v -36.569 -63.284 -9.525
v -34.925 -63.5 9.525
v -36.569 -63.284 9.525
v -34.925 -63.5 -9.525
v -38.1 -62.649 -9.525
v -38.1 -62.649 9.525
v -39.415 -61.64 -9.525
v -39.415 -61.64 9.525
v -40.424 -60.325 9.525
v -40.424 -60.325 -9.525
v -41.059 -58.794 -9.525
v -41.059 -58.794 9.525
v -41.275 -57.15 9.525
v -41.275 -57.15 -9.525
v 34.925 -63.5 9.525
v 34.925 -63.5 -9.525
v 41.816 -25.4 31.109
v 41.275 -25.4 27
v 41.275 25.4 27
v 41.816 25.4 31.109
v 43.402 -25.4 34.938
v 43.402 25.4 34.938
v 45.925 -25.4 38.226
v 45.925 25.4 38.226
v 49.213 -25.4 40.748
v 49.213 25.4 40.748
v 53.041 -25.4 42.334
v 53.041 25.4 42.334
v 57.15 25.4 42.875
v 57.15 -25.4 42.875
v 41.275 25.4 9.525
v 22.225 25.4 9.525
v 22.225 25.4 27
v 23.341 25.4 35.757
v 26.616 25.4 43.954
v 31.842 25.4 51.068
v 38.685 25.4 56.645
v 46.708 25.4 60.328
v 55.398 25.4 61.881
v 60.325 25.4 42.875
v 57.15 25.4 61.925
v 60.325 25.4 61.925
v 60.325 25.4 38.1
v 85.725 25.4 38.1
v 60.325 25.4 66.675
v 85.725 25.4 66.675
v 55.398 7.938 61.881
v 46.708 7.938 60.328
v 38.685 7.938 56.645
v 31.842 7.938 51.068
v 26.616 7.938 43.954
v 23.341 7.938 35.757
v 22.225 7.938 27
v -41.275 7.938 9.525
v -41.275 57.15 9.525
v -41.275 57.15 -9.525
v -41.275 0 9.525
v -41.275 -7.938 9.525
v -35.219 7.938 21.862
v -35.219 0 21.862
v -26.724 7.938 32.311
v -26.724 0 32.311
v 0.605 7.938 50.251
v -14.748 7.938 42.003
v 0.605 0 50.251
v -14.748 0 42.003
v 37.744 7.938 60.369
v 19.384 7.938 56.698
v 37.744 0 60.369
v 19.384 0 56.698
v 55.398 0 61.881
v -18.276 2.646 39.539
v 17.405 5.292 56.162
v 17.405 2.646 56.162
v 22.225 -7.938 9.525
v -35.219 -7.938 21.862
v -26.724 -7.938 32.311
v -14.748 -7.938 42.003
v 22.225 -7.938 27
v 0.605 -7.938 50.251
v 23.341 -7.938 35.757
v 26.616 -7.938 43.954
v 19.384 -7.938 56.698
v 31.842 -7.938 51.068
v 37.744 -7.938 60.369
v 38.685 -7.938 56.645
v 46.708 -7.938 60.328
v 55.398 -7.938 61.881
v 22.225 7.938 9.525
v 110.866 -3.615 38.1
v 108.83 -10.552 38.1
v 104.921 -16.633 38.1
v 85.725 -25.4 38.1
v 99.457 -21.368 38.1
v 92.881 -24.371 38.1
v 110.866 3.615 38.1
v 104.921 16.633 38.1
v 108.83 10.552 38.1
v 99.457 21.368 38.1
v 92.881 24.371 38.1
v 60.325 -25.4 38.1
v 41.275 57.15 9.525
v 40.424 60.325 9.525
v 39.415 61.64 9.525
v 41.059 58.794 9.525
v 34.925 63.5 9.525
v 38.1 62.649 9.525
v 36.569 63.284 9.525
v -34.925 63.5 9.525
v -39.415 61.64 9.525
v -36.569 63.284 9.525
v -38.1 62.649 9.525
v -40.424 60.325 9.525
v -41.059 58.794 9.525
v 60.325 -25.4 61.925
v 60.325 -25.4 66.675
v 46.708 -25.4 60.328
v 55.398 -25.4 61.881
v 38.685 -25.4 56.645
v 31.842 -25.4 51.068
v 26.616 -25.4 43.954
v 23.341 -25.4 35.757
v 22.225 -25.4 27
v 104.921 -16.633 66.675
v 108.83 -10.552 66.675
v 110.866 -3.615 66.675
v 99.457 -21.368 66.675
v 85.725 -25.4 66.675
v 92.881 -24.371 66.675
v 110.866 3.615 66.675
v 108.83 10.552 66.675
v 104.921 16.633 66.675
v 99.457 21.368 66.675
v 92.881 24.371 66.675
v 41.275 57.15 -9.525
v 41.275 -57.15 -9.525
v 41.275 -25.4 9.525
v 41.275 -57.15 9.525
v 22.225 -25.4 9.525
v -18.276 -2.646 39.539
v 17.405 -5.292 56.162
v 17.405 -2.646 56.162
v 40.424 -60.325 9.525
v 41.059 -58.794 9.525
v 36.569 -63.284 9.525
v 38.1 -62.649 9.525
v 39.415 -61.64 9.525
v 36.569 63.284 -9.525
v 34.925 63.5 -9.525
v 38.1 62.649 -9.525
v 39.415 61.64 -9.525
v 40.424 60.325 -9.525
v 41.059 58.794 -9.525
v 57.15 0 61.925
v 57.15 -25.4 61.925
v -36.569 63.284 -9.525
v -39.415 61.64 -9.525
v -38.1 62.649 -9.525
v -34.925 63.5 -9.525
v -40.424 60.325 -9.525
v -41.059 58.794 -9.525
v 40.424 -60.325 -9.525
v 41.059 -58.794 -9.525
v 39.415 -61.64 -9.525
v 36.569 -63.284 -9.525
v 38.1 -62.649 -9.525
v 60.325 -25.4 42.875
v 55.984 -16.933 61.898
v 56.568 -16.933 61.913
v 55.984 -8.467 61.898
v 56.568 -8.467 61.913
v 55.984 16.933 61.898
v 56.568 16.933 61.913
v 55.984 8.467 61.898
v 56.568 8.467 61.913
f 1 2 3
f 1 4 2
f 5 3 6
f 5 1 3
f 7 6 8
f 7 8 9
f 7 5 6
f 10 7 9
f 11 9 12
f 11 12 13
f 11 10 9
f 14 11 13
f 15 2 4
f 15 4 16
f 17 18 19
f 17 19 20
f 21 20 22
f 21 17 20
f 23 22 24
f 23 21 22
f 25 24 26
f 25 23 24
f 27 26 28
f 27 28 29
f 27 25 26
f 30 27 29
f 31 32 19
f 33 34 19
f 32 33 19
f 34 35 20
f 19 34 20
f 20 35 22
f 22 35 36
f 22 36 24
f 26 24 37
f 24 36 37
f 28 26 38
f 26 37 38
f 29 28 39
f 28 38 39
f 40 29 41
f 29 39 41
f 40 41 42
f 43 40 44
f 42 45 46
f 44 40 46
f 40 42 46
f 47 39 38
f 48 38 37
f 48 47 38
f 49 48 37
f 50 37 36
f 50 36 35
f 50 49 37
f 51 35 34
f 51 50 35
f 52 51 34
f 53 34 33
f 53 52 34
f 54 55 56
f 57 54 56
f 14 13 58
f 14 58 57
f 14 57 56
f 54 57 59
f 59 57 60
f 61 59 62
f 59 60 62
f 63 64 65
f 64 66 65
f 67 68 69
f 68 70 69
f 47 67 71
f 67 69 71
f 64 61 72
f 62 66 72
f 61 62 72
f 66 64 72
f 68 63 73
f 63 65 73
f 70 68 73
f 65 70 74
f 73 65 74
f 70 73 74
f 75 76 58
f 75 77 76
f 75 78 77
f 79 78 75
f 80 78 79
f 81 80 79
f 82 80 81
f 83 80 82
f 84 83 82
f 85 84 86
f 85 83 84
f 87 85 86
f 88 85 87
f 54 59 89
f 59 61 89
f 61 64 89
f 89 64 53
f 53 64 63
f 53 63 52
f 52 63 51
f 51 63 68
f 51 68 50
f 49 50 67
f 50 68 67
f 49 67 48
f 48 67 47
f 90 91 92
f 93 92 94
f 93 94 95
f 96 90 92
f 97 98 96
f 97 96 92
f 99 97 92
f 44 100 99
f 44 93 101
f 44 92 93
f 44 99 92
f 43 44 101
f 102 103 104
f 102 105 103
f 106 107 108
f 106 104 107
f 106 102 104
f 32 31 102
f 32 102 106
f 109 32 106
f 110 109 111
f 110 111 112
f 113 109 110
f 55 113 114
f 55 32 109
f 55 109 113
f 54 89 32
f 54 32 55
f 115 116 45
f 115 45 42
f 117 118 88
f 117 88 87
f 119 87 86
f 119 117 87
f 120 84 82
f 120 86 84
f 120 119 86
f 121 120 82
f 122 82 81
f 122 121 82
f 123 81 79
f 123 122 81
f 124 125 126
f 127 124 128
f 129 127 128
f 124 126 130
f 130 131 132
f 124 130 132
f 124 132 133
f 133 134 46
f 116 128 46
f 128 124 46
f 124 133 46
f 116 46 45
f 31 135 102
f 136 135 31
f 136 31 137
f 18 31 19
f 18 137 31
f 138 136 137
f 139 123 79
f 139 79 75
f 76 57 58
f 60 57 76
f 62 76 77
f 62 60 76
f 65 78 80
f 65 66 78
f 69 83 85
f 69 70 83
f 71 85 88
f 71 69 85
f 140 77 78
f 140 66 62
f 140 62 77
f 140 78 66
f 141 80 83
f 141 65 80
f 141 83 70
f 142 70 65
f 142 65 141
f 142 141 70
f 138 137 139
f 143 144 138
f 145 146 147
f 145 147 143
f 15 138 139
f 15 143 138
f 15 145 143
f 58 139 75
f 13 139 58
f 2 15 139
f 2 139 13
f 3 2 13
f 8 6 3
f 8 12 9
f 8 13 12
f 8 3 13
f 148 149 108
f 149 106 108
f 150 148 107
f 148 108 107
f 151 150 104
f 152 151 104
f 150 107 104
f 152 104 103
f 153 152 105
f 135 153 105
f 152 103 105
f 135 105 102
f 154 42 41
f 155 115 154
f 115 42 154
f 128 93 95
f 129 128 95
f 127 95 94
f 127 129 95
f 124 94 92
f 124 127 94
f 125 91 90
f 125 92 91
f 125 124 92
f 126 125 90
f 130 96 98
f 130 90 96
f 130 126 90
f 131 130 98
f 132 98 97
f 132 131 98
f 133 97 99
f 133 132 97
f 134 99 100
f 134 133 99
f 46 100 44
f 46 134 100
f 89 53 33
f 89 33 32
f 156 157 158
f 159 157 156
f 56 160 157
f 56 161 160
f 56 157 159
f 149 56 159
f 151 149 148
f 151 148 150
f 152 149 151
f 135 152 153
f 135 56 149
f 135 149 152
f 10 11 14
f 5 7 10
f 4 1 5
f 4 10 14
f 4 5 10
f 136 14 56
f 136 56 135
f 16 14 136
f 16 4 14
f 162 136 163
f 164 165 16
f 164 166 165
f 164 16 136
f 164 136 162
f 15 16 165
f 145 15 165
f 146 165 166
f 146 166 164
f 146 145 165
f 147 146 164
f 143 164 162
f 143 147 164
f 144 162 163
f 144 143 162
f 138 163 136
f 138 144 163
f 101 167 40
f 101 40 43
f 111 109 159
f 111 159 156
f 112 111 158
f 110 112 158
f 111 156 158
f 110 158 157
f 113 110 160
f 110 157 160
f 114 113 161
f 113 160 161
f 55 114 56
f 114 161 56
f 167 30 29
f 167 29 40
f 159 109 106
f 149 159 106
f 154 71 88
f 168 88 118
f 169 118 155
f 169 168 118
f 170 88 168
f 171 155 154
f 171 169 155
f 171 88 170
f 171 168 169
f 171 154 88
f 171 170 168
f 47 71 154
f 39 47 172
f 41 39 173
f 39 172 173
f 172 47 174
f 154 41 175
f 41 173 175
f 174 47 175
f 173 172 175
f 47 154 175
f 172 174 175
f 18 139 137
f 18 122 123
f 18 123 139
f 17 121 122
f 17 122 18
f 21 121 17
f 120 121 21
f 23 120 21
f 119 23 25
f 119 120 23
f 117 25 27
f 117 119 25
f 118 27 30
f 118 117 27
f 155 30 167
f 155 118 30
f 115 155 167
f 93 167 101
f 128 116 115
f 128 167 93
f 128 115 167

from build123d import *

# Parameters (mm, degrees)
F1_DEPTH = 63.5
F2_DEPTH = 25.4
F3_DEPTH = 7.9375
F0_W     = 25.4
F0_H     = 28.575
F5_R     = 6.35


with BuildPart() as f1:
    # F0 (on Front) → F1 (new body, symmetric)
    with BuildSketch(Plane.XZ):
        Polygon((41.275, -9.525), (41.275, 9.525), (22.225, 9.525), (-41.275, 9.525), (-41.275, -9.525), align=None)
    extrude(amount=F1_DEPTH, both=True)

    # F0 (on Front) → F2 (join, symmetric)
    with BuildSketch(Plane.XZ):
        with BuildLine():
            Line((22.225, 9.525), (41.275, 9.525))
            Line((41.275, 9.525), (41.275, 27.0002))
            ThreePointArc((41.275, 27.0002), (45.92468, 38.22552), (57.15, 42.8752))
            Line((57.15, 42.8752), (60.325, 42.8752))
            Line((60.325, 42.8752), (60.325, 61.9252))
            Line((60.325, 61.9252), (57.15, 61.9252))
            add(Edge.make_bspline(
                [(55.397646, 61.88121), (55.98511, 61.899276), (56.569297, 61.913923), (57.15, 61.9252)],
                knots=[109.698867, 109.698867, 109.698867, 109.698867, 111.504536, 111.504536, 111.504536, 111.504536], degree=3))
            ThreePointArc((55.397646, 61.88121), (31.842327, 51.068381), (22.225, 27.0002))
            Line((22.225, 27.0002), (22.225, 9.525))
        make_face()
        Polygon((60.325, 61.9252), (60.325, 42.8752), (60.325, 38.1), (85.725, 38.1), (85.725, 66.675), (60.325, 66.675), align=None)
    extrude(amount=F2_DEPTH, both=True)

    # F0 (on Front) → F3 (join, symmetric)
    with BuildSketch(Plane.XZ):
        with BuildLine():
            Line((-41.275, 9.525), (22.225, 9.525))
            Line((22.225, 9.525), (22.225, 27.0002))
            ThreePointArc((22.225, 27.0002), (31.842327, 51.068381), (55.397646, 61.88121))
            add(Edge.make_bspline(
                [(-41.275, 9.525), (-28.07554, 47.064815), (19.707757, 60.783645), (55.397646, 61.88121)],
                knots=[0, 0, 0, 0, 109.698867, 109.698867, 109.698867, 109.698867], degree=3))
        make_face()
    extrude(amount=F3_DEPTH, both=True)

    # F0 (on Front) → F4 (revolve)
    with BuildSketch(Plane.XZ):
        with Locations((98.425, 52.3875)):
            Rectangle(F0_W, F0_H)
    revolve(axis=Axis((85.725, 0, 52.3875), (0, 0, 1)))

    # F5
    f5_edges = [f1.edges().sort_by_distance(p)[0] for p in [
        (-41.275, -63.5, 0),
        (41.275, -63.5, 0),
        (41.275, 63.5, 0),
        (-41.275, 63.5, 0),
    ]]
    fillet(f5_edges, radius=F5_R)


solid = f1.part
